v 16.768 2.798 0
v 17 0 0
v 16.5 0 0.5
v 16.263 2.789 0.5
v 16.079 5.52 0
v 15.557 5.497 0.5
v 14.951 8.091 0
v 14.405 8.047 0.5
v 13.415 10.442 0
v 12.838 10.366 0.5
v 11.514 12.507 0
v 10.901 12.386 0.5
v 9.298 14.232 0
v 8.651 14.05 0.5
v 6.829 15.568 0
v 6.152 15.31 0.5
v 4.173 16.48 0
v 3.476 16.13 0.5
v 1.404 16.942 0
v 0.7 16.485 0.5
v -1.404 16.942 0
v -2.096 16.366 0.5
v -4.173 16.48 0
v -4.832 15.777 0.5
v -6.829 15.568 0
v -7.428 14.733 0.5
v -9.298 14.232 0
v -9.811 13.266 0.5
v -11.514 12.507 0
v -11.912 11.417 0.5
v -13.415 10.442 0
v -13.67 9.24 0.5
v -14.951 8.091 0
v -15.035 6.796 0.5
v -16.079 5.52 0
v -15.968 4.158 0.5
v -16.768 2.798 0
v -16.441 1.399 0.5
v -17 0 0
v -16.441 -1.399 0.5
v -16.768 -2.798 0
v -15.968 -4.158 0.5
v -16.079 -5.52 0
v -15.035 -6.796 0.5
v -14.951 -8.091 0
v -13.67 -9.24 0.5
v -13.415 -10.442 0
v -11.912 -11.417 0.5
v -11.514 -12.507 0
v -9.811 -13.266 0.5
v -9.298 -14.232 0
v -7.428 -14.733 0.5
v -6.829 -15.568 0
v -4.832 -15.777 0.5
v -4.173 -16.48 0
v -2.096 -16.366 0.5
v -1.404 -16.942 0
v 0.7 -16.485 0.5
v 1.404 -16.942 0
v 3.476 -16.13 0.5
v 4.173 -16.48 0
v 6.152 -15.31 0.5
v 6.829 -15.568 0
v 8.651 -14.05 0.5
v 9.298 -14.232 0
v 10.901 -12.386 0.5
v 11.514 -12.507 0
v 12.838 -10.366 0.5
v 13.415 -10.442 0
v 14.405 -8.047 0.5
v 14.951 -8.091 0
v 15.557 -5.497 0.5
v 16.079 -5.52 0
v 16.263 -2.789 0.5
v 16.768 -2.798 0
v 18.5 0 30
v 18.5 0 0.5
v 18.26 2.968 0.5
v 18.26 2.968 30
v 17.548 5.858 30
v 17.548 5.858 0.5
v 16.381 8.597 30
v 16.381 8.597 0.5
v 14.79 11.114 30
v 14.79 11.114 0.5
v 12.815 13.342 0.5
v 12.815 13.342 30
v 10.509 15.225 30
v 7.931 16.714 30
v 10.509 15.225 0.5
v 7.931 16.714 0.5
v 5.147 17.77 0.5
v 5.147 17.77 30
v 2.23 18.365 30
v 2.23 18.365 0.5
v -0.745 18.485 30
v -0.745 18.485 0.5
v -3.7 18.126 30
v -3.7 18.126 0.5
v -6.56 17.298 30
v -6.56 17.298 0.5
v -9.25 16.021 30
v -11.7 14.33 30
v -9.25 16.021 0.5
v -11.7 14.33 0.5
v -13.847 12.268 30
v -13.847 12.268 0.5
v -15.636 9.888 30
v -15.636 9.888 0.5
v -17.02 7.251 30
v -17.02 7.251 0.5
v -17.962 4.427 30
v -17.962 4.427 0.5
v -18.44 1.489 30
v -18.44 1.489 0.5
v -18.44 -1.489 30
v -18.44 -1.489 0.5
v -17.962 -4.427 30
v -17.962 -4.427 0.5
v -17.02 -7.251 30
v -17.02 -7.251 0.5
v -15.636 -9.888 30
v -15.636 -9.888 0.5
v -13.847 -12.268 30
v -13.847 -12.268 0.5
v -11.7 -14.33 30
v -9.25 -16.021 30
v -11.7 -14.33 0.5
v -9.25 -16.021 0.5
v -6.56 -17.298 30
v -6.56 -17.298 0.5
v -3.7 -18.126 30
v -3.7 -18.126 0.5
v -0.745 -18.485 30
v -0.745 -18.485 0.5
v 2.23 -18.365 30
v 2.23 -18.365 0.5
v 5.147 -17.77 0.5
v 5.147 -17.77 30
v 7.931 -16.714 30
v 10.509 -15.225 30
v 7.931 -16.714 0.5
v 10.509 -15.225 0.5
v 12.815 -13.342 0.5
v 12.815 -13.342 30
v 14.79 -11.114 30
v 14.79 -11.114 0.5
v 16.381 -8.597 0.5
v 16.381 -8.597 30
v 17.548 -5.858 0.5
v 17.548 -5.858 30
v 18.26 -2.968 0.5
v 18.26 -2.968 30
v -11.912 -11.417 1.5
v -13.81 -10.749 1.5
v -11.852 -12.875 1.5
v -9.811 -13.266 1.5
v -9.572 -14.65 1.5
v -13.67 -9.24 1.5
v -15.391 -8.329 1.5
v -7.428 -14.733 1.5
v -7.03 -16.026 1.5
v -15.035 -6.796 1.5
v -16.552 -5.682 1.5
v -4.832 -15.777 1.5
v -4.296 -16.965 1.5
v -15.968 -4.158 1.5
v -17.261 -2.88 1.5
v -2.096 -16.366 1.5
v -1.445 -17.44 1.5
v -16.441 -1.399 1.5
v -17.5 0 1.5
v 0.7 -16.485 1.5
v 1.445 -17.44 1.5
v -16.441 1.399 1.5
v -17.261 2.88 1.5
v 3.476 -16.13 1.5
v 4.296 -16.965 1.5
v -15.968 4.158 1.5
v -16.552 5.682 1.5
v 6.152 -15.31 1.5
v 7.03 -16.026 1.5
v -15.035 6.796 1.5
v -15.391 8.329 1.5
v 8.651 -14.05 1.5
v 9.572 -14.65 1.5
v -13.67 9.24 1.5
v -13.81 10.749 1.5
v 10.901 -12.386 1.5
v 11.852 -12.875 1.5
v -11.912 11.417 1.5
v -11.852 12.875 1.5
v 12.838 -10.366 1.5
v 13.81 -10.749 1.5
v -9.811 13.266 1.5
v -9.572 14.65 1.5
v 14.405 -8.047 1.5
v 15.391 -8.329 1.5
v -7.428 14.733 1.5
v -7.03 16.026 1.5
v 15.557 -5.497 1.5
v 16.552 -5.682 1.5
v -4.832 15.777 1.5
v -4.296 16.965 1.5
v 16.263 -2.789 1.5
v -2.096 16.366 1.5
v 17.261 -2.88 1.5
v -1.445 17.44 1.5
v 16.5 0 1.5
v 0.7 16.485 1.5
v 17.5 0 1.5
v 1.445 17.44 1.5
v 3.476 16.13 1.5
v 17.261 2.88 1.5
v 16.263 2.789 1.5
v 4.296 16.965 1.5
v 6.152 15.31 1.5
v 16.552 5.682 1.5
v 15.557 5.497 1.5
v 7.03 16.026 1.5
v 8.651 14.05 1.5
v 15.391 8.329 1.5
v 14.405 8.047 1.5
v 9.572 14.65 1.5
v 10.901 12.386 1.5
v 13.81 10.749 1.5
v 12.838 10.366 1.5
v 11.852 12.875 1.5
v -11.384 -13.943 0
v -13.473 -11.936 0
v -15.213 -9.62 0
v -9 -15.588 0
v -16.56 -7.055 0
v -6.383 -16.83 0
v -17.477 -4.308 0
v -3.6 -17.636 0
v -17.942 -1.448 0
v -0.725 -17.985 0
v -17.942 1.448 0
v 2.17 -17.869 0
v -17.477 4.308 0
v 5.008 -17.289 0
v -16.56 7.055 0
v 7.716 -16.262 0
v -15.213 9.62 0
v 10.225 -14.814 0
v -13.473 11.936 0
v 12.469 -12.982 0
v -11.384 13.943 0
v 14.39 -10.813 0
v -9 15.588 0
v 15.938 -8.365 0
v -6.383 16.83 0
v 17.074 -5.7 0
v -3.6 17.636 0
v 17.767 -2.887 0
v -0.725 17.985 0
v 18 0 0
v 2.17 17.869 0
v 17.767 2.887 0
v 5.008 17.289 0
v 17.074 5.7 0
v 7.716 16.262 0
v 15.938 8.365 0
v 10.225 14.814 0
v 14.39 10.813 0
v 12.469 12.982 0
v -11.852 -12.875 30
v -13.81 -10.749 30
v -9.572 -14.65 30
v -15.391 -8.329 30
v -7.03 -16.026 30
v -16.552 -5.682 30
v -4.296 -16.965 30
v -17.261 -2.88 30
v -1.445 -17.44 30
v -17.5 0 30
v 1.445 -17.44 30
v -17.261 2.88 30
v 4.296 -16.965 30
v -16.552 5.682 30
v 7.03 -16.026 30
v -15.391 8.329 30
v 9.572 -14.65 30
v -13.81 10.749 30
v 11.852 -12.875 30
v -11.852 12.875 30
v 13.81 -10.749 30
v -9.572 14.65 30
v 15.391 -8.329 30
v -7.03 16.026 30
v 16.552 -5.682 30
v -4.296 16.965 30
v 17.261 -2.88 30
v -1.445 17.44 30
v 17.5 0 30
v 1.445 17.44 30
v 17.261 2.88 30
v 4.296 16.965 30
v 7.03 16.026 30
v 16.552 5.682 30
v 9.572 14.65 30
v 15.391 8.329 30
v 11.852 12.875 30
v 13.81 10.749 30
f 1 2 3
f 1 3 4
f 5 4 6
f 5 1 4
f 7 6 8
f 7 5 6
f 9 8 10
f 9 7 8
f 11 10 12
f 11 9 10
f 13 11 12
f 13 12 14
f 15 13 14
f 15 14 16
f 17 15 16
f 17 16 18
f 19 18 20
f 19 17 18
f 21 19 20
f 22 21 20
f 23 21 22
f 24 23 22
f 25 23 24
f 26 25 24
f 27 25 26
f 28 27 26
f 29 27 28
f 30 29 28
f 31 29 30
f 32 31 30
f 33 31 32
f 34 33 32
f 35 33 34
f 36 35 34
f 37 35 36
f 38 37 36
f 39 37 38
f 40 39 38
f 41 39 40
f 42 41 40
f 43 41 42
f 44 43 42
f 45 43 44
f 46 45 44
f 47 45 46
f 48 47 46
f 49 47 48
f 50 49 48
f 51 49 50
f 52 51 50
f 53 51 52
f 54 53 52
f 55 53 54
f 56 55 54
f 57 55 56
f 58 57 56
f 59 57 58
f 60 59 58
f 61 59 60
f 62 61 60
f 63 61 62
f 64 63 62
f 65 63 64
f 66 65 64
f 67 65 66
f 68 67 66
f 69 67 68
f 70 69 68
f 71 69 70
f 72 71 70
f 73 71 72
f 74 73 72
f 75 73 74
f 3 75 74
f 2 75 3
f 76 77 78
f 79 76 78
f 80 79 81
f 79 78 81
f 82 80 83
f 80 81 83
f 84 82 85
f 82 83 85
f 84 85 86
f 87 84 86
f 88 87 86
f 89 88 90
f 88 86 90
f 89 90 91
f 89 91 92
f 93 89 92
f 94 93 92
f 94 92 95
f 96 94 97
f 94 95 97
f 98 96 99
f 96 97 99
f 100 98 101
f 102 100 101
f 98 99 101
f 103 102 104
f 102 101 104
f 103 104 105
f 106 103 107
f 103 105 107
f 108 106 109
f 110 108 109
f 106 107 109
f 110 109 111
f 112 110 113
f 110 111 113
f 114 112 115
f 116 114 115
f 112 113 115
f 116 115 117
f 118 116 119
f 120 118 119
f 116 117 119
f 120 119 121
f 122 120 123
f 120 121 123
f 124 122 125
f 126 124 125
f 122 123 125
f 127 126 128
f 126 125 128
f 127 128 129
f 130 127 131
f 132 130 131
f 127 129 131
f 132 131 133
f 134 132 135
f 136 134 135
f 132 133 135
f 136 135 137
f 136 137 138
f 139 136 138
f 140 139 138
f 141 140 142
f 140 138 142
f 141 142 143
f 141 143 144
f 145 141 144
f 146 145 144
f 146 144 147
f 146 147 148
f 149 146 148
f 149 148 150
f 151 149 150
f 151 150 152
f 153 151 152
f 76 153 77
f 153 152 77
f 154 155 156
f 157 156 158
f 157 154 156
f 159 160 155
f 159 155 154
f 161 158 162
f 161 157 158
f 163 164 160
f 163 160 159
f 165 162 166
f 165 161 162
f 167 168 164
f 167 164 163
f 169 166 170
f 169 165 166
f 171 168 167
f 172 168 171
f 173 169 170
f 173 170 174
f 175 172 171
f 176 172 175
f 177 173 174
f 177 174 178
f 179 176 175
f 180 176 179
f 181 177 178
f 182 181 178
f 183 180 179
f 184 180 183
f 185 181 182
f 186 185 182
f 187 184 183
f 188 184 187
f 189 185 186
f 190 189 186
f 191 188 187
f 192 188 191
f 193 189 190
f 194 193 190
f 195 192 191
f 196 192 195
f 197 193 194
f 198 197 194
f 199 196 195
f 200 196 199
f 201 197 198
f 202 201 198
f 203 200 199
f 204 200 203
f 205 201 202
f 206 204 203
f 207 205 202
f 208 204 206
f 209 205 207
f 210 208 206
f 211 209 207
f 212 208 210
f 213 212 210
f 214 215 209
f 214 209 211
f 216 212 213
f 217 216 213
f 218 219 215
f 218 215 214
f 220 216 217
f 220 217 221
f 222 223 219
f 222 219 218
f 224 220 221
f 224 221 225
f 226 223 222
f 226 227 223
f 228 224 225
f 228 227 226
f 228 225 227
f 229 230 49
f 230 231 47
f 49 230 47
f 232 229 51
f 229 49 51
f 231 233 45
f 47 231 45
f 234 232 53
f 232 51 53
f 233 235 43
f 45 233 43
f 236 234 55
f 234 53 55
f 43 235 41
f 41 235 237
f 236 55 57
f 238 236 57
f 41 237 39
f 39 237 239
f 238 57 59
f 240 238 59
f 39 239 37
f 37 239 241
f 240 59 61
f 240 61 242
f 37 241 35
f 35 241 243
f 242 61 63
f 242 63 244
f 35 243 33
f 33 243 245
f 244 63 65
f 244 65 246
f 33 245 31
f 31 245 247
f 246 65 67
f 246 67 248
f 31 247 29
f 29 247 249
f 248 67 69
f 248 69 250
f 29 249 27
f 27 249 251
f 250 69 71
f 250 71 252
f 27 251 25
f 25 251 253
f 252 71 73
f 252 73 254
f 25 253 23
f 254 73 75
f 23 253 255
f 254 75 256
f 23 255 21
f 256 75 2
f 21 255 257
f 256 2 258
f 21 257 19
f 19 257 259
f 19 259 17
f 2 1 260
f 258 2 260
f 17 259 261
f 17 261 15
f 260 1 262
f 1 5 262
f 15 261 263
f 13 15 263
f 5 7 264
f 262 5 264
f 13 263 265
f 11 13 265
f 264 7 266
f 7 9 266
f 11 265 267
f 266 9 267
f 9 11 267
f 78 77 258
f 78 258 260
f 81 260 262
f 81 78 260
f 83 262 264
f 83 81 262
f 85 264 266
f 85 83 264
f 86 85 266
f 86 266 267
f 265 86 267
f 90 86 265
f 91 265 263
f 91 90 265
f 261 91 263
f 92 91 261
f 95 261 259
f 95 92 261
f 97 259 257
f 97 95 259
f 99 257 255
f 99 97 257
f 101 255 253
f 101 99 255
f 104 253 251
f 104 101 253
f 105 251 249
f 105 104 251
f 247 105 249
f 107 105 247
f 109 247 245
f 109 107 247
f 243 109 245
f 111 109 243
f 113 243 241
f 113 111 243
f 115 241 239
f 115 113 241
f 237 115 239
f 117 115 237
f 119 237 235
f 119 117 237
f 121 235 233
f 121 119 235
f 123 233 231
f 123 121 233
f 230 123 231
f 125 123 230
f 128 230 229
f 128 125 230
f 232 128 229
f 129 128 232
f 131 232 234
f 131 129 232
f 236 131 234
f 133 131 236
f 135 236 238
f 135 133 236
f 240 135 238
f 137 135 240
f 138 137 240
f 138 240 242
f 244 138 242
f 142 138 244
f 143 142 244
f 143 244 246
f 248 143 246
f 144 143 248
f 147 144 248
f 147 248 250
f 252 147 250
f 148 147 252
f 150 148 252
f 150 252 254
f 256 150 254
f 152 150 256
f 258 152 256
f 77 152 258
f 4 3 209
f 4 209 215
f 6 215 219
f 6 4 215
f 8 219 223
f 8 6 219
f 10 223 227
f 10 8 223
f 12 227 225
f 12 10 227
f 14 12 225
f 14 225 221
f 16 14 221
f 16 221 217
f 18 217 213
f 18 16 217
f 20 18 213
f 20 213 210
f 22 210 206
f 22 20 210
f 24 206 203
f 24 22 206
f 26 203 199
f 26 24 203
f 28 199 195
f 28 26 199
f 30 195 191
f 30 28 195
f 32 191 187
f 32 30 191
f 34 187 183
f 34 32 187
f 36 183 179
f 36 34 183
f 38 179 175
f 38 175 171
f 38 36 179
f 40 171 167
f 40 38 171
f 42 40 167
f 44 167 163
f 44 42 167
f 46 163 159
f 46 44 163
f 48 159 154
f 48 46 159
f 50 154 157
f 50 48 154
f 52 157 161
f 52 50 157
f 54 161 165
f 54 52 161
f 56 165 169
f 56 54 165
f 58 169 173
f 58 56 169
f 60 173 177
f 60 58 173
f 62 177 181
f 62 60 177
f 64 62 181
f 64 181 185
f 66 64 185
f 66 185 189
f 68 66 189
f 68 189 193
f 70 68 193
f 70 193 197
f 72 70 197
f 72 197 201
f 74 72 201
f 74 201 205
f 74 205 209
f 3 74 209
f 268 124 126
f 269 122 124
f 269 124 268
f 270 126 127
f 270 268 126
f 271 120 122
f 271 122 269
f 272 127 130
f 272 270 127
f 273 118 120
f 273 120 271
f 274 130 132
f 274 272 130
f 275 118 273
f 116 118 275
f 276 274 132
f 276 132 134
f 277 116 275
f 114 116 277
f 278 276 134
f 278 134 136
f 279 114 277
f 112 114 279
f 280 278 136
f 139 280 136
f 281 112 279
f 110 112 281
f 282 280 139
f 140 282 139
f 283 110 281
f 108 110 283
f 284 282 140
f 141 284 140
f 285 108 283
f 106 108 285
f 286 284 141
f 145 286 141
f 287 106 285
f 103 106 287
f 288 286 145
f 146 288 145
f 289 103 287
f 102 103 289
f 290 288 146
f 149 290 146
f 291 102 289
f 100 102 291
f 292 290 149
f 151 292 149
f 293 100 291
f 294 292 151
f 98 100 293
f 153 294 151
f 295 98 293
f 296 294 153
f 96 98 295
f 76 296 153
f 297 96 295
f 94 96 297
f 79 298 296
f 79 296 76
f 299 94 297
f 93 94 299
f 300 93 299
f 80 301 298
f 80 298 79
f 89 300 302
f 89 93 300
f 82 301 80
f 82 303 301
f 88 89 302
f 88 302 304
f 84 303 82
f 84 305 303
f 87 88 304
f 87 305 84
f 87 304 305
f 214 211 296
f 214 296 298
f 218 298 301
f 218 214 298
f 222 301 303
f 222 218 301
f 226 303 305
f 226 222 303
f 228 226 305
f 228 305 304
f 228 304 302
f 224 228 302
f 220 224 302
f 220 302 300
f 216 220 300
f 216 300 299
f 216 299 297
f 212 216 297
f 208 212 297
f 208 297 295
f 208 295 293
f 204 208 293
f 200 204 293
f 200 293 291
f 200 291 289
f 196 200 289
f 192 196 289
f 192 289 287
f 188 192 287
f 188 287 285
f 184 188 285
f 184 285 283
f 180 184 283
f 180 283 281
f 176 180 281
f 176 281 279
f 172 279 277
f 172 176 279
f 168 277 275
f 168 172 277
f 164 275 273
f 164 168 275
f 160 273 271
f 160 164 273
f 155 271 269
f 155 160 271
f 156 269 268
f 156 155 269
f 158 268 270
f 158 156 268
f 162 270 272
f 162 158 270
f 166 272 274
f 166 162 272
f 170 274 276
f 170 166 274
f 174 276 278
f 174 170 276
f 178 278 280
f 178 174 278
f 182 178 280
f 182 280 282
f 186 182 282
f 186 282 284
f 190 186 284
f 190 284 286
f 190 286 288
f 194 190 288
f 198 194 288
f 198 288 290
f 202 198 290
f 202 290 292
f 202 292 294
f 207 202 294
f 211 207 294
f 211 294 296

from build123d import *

# Parameters (mm, degrees)
F0_R     = 18.5
F0_R_2   = 17.5
F1_DEPTH = 30
F0_R_3   = 16.5
F2_DEPTH = 1.5
F3_SIZE  = 0.5


with BuildPart() as f1:
    # F0 (on Top) → F1 (new body)
    with BuildSketch(Plane.XY):
        Circle(F0_R)
        Circle(F0_R_2, mode=Mode.SUBTRACT)
    extrude(amount=F1_DEPTH)

    # F0 (on Top) → F2 (join)
    with BuildSketch(Plane.XY):
        Circle(F0_R_2)
        Circle(F0_R_3, mode=Mode.SUBTRACT)
    extrude(amount=F2_DEPTH)

    # F3
    f3_edges = [f1.edges().sort_by_distance(p)[0] for p in [
        (-18.5, 0, 0),
        (-16.5, 0, 0),
    ]]
    chamfer(f3_edges, length=F3_SIZE)


solid = f1.part
